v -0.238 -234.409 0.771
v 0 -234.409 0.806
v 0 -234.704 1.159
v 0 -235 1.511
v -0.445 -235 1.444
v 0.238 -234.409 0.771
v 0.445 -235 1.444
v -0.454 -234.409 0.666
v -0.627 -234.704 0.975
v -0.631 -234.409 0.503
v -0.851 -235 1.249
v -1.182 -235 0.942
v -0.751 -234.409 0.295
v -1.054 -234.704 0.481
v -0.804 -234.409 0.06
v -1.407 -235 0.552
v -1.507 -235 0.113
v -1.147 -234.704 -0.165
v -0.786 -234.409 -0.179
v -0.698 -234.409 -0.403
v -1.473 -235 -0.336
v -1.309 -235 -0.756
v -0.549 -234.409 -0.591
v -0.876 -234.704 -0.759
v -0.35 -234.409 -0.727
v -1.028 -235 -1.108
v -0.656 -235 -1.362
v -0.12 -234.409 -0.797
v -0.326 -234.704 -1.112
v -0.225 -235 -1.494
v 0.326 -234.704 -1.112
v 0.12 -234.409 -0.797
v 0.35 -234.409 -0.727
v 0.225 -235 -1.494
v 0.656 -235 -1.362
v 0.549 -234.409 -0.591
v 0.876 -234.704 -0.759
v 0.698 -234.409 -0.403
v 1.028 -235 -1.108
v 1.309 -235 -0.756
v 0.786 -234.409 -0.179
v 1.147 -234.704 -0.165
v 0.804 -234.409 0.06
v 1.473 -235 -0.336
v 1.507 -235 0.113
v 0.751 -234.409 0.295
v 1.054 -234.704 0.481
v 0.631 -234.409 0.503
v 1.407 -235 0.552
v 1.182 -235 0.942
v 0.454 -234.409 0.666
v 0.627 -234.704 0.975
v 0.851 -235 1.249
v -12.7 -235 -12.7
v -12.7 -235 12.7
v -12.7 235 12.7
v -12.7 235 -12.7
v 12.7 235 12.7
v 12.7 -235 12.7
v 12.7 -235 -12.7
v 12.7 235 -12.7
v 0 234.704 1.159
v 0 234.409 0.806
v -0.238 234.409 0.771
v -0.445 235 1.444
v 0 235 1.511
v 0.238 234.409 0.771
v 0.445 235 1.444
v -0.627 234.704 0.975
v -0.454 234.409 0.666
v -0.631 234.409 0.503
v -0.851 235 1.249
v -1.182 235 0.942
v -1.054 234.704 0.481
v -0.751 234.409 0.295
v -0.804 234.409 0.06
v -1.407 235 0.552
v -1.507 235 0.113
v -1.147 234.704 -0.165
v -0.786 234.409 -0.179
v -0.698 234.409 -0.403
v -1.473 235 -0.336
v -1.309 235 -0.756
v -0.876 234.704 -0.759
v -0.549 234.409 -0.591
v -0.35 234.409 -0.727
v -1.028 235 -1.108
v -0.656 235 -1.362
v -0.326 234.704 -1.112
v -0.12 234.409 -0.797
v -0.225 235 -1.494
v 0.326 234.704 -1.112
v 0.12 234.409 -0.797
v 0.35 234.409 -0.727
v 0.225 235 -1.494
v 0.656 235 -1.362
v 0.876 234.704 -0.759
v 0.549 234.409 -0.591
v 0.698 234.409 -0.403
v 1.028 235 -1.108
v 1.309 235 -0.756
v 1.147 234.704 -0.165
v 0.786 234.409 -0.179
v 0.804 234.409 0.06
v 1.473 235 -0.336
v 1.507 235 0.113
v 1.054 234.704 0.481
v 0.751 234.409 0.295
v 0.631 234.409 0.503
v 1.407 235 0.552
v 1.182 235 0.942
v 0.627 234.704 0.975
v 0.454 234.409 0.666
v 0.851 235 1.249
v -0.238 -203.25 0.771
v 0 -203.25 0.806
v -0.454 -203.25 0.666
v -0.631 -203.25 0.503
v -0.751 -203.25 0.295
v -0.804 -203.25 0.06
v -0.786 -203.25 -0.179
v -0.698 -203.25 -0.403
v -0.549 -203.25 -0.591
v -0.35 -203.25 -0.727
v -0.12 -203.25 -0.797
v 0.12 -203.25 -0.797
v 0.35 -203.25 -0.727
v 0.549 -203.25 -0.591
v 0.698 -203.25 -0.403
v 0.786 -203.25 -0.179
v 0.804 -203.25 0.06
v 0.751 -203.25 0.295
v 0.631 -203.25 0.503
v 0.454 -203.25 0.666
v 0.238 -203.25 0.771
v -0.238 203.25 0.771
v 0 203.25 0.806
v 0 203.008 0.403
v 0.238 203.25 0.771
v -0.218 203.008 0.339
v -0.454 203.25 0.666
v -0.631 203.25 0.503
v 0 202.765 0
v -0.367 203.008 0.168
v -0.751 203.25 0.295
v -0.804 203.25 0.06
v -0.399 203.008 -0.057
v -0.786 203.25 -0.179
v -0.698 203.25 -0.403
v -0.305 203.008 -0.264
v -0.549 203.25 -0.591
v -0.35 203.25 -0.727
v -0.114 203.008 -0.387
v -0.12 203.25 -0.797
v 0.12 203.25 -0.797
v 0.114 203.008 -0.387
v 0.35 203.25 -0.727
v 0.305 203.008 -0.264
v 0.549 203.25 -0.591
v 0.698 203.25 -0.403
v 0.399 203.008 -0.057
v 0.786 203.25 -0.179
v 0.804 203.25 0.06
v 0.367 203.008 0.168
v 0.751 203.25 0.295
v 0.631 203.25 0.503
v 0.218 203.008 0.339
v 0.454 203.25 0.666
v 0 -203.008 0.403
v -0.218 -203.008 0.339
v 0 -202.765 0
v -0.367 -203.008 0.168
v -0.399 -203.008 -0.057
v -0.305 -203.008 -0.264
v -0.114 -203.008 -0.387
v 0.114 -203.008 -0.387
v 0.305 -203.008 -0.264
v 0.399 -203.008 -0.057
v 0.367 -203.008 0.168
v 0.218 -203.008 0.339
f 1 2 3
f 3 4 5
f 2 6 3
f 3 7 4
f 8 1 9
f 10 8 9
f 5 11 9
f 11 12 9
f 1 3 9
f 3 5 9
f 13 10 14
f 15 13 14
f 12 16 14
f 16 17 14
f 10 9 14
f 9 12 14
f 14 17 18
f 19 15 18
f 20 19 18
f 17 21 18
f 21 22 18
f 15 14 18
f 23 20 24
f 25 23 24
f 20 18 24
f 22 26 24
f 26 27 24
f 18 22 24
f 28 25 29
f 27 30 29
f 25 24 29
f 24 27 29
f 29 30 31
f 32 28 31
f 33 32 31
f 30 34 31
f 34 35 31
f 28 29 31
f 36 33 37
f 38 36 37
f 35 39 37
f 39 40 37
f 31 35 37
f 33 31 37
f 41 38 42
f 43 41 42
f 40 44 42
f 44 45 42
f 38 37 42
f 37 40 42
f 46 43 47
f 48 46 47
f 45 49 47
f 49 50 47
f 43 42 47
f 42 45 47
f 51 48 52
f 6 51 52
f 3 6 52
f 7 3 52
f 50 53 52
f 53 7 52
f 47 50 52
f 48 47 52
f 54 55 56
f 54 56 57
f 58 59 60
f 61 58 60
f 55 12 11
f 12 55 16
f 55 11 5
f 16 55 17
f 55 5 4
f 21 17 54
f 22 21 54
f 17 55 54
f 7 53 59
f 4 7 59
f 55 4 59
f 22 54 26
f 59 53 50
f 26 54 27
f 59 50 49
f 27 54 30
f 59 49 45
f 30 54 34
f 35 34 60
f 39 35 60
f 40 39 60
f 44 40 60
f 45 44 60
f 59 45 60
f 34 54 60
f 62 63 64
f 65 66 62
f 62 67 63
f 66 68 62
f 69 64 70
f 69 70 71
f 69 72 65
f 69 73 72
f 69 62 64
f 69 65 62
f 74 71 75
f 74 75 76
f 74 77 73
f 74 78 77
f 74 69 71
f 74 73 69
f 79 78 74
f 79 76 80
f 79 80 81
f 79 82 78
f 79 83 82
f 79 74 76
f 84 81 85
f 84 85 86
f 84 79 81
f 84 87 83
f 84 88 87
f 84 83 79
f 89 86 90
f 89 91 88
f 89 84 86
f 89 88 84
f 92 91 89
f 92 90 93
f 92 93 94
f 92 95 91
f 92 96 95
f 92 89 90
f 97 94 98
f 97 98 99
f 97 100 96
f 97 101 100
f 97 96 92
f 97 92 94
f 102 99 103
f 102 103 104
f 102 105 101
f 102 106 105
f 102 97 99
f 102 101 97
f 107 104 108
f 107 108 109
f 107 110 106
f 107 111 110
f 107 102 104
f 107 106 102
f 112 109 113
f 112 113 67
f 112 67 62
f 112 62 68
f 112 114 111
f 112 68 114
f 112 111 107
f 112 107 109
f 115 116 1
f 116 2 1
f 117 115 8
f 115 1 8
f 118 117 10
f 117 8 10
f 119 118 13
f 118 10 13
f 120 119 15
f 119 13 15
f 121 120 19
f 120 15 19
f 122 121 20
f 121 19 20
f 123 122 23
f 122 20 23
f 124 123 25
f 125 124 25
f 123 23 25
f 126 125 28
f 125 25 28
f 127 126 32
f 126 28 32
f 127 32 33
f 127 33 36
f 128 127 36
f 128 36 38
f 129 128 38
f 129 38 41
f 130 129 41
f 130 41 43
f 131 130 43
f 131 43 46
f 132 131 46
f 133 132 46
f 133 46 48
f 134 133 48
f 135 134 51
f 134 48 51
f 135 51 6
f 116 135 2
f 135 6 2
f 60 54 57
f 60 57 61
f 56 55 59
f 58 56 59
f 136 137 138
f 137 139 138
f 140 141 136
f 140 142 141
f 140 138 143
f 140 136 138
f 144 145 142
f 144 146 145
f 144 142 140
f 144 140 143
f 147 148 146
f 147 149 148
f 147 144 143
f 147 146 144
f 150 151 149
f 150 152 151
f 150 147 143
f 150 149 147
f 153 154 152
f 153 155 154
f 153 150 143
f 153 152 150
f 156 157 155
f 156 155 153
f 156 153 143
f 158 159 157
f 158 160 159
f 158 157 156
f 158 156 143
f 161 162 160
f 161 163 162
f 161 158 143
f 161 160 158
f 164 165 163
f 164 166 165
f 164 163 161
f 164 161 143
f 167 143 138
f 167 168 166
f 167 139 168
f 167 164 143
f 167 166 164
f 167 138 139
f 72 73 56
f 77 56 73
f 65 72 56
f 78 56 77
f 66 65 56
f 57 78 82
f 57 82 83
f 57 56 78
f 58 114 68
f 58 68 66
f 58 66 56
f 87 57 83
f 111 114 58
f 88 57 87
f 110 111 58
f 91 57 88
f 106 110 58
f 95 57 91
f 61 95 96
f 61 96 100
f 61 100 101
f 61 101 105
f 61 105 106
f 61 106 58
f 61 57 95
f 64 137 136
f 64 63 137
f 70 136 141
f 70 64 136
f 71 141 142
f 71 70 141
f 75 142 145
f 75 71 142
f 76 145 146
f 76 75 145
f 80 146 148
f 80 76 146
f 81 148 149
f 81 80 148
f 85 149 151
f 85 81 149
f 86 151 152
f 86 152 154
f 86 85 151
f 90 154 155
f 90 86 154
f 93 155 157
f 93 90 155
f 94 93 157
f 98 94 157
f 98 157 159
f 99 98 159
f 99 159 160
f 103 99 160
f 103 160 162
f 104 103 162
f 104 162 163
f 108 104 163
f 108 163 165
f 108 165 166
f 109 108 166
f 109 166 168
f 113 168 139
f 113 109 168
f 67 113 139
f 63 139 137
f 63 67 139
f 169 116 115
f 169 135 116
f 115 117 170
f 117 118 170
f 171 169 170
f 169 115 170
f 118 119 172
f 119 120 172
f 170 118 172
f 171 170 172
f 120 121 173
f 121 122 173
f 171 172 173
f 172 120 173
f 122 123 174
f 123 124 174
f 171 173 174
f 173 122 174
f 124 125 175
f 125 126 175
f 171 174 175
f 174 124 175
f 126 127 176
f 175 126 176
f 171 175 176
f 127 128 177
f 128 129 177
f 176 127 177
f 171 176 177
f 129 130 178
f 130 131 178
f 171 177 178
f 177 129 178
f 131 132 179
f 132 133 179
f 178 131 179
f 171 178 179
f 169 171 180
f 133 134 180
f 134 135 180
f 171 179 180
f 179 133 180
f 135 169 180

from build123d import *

# Parameters (mm, degrees)
SKETCH1_W           = 25.4
SKETCH1_H           = 25.4
BOSS_EXTRUDE1_DEPTH = 235


with BuildPart() as part:
    # Sketch1 → Boss-Extrude1 (new body, symmetric)
    with BuildSketch(Plane(origin=(0, 0, 0), x_dir=(1, 0, 0), z_dir=(0, 1, 0))):
        Rectangle(SKETCH1_W, SKETCH1_H)
    extrude(amount=BOSS_EXTRUDE1_DEPTH, both=True)

    # Sketch3 → CSK for #0 Flat Head Machine Screw (100)1 (revolve, cut)
    with BuildSketch(Plane(origin=(0, 235, 0), x_dir=(0, 0, 1), z_dir=(1, 0, 0))):
        Polygon((0, 0), (0, 32.234564046), (0.80645, 31.75), (0.80645, 0.591439375), (1.5113, 0), align=None)
    csk_for_0_flat_head_machine_screw_100 = revolve(axis=Axis((0, 241.35, 0), (0, -1, 0)), mode=Mode.SUBTRACT)

    # Mirror1: CSK for #0 Flat Head Machine Screw (100)1 across plane
    add(csk_for_0_flat_head_machine_screw_100.mirror(Plane.ZX), mode=Mode.SUBTRACT)


solid = part.part
